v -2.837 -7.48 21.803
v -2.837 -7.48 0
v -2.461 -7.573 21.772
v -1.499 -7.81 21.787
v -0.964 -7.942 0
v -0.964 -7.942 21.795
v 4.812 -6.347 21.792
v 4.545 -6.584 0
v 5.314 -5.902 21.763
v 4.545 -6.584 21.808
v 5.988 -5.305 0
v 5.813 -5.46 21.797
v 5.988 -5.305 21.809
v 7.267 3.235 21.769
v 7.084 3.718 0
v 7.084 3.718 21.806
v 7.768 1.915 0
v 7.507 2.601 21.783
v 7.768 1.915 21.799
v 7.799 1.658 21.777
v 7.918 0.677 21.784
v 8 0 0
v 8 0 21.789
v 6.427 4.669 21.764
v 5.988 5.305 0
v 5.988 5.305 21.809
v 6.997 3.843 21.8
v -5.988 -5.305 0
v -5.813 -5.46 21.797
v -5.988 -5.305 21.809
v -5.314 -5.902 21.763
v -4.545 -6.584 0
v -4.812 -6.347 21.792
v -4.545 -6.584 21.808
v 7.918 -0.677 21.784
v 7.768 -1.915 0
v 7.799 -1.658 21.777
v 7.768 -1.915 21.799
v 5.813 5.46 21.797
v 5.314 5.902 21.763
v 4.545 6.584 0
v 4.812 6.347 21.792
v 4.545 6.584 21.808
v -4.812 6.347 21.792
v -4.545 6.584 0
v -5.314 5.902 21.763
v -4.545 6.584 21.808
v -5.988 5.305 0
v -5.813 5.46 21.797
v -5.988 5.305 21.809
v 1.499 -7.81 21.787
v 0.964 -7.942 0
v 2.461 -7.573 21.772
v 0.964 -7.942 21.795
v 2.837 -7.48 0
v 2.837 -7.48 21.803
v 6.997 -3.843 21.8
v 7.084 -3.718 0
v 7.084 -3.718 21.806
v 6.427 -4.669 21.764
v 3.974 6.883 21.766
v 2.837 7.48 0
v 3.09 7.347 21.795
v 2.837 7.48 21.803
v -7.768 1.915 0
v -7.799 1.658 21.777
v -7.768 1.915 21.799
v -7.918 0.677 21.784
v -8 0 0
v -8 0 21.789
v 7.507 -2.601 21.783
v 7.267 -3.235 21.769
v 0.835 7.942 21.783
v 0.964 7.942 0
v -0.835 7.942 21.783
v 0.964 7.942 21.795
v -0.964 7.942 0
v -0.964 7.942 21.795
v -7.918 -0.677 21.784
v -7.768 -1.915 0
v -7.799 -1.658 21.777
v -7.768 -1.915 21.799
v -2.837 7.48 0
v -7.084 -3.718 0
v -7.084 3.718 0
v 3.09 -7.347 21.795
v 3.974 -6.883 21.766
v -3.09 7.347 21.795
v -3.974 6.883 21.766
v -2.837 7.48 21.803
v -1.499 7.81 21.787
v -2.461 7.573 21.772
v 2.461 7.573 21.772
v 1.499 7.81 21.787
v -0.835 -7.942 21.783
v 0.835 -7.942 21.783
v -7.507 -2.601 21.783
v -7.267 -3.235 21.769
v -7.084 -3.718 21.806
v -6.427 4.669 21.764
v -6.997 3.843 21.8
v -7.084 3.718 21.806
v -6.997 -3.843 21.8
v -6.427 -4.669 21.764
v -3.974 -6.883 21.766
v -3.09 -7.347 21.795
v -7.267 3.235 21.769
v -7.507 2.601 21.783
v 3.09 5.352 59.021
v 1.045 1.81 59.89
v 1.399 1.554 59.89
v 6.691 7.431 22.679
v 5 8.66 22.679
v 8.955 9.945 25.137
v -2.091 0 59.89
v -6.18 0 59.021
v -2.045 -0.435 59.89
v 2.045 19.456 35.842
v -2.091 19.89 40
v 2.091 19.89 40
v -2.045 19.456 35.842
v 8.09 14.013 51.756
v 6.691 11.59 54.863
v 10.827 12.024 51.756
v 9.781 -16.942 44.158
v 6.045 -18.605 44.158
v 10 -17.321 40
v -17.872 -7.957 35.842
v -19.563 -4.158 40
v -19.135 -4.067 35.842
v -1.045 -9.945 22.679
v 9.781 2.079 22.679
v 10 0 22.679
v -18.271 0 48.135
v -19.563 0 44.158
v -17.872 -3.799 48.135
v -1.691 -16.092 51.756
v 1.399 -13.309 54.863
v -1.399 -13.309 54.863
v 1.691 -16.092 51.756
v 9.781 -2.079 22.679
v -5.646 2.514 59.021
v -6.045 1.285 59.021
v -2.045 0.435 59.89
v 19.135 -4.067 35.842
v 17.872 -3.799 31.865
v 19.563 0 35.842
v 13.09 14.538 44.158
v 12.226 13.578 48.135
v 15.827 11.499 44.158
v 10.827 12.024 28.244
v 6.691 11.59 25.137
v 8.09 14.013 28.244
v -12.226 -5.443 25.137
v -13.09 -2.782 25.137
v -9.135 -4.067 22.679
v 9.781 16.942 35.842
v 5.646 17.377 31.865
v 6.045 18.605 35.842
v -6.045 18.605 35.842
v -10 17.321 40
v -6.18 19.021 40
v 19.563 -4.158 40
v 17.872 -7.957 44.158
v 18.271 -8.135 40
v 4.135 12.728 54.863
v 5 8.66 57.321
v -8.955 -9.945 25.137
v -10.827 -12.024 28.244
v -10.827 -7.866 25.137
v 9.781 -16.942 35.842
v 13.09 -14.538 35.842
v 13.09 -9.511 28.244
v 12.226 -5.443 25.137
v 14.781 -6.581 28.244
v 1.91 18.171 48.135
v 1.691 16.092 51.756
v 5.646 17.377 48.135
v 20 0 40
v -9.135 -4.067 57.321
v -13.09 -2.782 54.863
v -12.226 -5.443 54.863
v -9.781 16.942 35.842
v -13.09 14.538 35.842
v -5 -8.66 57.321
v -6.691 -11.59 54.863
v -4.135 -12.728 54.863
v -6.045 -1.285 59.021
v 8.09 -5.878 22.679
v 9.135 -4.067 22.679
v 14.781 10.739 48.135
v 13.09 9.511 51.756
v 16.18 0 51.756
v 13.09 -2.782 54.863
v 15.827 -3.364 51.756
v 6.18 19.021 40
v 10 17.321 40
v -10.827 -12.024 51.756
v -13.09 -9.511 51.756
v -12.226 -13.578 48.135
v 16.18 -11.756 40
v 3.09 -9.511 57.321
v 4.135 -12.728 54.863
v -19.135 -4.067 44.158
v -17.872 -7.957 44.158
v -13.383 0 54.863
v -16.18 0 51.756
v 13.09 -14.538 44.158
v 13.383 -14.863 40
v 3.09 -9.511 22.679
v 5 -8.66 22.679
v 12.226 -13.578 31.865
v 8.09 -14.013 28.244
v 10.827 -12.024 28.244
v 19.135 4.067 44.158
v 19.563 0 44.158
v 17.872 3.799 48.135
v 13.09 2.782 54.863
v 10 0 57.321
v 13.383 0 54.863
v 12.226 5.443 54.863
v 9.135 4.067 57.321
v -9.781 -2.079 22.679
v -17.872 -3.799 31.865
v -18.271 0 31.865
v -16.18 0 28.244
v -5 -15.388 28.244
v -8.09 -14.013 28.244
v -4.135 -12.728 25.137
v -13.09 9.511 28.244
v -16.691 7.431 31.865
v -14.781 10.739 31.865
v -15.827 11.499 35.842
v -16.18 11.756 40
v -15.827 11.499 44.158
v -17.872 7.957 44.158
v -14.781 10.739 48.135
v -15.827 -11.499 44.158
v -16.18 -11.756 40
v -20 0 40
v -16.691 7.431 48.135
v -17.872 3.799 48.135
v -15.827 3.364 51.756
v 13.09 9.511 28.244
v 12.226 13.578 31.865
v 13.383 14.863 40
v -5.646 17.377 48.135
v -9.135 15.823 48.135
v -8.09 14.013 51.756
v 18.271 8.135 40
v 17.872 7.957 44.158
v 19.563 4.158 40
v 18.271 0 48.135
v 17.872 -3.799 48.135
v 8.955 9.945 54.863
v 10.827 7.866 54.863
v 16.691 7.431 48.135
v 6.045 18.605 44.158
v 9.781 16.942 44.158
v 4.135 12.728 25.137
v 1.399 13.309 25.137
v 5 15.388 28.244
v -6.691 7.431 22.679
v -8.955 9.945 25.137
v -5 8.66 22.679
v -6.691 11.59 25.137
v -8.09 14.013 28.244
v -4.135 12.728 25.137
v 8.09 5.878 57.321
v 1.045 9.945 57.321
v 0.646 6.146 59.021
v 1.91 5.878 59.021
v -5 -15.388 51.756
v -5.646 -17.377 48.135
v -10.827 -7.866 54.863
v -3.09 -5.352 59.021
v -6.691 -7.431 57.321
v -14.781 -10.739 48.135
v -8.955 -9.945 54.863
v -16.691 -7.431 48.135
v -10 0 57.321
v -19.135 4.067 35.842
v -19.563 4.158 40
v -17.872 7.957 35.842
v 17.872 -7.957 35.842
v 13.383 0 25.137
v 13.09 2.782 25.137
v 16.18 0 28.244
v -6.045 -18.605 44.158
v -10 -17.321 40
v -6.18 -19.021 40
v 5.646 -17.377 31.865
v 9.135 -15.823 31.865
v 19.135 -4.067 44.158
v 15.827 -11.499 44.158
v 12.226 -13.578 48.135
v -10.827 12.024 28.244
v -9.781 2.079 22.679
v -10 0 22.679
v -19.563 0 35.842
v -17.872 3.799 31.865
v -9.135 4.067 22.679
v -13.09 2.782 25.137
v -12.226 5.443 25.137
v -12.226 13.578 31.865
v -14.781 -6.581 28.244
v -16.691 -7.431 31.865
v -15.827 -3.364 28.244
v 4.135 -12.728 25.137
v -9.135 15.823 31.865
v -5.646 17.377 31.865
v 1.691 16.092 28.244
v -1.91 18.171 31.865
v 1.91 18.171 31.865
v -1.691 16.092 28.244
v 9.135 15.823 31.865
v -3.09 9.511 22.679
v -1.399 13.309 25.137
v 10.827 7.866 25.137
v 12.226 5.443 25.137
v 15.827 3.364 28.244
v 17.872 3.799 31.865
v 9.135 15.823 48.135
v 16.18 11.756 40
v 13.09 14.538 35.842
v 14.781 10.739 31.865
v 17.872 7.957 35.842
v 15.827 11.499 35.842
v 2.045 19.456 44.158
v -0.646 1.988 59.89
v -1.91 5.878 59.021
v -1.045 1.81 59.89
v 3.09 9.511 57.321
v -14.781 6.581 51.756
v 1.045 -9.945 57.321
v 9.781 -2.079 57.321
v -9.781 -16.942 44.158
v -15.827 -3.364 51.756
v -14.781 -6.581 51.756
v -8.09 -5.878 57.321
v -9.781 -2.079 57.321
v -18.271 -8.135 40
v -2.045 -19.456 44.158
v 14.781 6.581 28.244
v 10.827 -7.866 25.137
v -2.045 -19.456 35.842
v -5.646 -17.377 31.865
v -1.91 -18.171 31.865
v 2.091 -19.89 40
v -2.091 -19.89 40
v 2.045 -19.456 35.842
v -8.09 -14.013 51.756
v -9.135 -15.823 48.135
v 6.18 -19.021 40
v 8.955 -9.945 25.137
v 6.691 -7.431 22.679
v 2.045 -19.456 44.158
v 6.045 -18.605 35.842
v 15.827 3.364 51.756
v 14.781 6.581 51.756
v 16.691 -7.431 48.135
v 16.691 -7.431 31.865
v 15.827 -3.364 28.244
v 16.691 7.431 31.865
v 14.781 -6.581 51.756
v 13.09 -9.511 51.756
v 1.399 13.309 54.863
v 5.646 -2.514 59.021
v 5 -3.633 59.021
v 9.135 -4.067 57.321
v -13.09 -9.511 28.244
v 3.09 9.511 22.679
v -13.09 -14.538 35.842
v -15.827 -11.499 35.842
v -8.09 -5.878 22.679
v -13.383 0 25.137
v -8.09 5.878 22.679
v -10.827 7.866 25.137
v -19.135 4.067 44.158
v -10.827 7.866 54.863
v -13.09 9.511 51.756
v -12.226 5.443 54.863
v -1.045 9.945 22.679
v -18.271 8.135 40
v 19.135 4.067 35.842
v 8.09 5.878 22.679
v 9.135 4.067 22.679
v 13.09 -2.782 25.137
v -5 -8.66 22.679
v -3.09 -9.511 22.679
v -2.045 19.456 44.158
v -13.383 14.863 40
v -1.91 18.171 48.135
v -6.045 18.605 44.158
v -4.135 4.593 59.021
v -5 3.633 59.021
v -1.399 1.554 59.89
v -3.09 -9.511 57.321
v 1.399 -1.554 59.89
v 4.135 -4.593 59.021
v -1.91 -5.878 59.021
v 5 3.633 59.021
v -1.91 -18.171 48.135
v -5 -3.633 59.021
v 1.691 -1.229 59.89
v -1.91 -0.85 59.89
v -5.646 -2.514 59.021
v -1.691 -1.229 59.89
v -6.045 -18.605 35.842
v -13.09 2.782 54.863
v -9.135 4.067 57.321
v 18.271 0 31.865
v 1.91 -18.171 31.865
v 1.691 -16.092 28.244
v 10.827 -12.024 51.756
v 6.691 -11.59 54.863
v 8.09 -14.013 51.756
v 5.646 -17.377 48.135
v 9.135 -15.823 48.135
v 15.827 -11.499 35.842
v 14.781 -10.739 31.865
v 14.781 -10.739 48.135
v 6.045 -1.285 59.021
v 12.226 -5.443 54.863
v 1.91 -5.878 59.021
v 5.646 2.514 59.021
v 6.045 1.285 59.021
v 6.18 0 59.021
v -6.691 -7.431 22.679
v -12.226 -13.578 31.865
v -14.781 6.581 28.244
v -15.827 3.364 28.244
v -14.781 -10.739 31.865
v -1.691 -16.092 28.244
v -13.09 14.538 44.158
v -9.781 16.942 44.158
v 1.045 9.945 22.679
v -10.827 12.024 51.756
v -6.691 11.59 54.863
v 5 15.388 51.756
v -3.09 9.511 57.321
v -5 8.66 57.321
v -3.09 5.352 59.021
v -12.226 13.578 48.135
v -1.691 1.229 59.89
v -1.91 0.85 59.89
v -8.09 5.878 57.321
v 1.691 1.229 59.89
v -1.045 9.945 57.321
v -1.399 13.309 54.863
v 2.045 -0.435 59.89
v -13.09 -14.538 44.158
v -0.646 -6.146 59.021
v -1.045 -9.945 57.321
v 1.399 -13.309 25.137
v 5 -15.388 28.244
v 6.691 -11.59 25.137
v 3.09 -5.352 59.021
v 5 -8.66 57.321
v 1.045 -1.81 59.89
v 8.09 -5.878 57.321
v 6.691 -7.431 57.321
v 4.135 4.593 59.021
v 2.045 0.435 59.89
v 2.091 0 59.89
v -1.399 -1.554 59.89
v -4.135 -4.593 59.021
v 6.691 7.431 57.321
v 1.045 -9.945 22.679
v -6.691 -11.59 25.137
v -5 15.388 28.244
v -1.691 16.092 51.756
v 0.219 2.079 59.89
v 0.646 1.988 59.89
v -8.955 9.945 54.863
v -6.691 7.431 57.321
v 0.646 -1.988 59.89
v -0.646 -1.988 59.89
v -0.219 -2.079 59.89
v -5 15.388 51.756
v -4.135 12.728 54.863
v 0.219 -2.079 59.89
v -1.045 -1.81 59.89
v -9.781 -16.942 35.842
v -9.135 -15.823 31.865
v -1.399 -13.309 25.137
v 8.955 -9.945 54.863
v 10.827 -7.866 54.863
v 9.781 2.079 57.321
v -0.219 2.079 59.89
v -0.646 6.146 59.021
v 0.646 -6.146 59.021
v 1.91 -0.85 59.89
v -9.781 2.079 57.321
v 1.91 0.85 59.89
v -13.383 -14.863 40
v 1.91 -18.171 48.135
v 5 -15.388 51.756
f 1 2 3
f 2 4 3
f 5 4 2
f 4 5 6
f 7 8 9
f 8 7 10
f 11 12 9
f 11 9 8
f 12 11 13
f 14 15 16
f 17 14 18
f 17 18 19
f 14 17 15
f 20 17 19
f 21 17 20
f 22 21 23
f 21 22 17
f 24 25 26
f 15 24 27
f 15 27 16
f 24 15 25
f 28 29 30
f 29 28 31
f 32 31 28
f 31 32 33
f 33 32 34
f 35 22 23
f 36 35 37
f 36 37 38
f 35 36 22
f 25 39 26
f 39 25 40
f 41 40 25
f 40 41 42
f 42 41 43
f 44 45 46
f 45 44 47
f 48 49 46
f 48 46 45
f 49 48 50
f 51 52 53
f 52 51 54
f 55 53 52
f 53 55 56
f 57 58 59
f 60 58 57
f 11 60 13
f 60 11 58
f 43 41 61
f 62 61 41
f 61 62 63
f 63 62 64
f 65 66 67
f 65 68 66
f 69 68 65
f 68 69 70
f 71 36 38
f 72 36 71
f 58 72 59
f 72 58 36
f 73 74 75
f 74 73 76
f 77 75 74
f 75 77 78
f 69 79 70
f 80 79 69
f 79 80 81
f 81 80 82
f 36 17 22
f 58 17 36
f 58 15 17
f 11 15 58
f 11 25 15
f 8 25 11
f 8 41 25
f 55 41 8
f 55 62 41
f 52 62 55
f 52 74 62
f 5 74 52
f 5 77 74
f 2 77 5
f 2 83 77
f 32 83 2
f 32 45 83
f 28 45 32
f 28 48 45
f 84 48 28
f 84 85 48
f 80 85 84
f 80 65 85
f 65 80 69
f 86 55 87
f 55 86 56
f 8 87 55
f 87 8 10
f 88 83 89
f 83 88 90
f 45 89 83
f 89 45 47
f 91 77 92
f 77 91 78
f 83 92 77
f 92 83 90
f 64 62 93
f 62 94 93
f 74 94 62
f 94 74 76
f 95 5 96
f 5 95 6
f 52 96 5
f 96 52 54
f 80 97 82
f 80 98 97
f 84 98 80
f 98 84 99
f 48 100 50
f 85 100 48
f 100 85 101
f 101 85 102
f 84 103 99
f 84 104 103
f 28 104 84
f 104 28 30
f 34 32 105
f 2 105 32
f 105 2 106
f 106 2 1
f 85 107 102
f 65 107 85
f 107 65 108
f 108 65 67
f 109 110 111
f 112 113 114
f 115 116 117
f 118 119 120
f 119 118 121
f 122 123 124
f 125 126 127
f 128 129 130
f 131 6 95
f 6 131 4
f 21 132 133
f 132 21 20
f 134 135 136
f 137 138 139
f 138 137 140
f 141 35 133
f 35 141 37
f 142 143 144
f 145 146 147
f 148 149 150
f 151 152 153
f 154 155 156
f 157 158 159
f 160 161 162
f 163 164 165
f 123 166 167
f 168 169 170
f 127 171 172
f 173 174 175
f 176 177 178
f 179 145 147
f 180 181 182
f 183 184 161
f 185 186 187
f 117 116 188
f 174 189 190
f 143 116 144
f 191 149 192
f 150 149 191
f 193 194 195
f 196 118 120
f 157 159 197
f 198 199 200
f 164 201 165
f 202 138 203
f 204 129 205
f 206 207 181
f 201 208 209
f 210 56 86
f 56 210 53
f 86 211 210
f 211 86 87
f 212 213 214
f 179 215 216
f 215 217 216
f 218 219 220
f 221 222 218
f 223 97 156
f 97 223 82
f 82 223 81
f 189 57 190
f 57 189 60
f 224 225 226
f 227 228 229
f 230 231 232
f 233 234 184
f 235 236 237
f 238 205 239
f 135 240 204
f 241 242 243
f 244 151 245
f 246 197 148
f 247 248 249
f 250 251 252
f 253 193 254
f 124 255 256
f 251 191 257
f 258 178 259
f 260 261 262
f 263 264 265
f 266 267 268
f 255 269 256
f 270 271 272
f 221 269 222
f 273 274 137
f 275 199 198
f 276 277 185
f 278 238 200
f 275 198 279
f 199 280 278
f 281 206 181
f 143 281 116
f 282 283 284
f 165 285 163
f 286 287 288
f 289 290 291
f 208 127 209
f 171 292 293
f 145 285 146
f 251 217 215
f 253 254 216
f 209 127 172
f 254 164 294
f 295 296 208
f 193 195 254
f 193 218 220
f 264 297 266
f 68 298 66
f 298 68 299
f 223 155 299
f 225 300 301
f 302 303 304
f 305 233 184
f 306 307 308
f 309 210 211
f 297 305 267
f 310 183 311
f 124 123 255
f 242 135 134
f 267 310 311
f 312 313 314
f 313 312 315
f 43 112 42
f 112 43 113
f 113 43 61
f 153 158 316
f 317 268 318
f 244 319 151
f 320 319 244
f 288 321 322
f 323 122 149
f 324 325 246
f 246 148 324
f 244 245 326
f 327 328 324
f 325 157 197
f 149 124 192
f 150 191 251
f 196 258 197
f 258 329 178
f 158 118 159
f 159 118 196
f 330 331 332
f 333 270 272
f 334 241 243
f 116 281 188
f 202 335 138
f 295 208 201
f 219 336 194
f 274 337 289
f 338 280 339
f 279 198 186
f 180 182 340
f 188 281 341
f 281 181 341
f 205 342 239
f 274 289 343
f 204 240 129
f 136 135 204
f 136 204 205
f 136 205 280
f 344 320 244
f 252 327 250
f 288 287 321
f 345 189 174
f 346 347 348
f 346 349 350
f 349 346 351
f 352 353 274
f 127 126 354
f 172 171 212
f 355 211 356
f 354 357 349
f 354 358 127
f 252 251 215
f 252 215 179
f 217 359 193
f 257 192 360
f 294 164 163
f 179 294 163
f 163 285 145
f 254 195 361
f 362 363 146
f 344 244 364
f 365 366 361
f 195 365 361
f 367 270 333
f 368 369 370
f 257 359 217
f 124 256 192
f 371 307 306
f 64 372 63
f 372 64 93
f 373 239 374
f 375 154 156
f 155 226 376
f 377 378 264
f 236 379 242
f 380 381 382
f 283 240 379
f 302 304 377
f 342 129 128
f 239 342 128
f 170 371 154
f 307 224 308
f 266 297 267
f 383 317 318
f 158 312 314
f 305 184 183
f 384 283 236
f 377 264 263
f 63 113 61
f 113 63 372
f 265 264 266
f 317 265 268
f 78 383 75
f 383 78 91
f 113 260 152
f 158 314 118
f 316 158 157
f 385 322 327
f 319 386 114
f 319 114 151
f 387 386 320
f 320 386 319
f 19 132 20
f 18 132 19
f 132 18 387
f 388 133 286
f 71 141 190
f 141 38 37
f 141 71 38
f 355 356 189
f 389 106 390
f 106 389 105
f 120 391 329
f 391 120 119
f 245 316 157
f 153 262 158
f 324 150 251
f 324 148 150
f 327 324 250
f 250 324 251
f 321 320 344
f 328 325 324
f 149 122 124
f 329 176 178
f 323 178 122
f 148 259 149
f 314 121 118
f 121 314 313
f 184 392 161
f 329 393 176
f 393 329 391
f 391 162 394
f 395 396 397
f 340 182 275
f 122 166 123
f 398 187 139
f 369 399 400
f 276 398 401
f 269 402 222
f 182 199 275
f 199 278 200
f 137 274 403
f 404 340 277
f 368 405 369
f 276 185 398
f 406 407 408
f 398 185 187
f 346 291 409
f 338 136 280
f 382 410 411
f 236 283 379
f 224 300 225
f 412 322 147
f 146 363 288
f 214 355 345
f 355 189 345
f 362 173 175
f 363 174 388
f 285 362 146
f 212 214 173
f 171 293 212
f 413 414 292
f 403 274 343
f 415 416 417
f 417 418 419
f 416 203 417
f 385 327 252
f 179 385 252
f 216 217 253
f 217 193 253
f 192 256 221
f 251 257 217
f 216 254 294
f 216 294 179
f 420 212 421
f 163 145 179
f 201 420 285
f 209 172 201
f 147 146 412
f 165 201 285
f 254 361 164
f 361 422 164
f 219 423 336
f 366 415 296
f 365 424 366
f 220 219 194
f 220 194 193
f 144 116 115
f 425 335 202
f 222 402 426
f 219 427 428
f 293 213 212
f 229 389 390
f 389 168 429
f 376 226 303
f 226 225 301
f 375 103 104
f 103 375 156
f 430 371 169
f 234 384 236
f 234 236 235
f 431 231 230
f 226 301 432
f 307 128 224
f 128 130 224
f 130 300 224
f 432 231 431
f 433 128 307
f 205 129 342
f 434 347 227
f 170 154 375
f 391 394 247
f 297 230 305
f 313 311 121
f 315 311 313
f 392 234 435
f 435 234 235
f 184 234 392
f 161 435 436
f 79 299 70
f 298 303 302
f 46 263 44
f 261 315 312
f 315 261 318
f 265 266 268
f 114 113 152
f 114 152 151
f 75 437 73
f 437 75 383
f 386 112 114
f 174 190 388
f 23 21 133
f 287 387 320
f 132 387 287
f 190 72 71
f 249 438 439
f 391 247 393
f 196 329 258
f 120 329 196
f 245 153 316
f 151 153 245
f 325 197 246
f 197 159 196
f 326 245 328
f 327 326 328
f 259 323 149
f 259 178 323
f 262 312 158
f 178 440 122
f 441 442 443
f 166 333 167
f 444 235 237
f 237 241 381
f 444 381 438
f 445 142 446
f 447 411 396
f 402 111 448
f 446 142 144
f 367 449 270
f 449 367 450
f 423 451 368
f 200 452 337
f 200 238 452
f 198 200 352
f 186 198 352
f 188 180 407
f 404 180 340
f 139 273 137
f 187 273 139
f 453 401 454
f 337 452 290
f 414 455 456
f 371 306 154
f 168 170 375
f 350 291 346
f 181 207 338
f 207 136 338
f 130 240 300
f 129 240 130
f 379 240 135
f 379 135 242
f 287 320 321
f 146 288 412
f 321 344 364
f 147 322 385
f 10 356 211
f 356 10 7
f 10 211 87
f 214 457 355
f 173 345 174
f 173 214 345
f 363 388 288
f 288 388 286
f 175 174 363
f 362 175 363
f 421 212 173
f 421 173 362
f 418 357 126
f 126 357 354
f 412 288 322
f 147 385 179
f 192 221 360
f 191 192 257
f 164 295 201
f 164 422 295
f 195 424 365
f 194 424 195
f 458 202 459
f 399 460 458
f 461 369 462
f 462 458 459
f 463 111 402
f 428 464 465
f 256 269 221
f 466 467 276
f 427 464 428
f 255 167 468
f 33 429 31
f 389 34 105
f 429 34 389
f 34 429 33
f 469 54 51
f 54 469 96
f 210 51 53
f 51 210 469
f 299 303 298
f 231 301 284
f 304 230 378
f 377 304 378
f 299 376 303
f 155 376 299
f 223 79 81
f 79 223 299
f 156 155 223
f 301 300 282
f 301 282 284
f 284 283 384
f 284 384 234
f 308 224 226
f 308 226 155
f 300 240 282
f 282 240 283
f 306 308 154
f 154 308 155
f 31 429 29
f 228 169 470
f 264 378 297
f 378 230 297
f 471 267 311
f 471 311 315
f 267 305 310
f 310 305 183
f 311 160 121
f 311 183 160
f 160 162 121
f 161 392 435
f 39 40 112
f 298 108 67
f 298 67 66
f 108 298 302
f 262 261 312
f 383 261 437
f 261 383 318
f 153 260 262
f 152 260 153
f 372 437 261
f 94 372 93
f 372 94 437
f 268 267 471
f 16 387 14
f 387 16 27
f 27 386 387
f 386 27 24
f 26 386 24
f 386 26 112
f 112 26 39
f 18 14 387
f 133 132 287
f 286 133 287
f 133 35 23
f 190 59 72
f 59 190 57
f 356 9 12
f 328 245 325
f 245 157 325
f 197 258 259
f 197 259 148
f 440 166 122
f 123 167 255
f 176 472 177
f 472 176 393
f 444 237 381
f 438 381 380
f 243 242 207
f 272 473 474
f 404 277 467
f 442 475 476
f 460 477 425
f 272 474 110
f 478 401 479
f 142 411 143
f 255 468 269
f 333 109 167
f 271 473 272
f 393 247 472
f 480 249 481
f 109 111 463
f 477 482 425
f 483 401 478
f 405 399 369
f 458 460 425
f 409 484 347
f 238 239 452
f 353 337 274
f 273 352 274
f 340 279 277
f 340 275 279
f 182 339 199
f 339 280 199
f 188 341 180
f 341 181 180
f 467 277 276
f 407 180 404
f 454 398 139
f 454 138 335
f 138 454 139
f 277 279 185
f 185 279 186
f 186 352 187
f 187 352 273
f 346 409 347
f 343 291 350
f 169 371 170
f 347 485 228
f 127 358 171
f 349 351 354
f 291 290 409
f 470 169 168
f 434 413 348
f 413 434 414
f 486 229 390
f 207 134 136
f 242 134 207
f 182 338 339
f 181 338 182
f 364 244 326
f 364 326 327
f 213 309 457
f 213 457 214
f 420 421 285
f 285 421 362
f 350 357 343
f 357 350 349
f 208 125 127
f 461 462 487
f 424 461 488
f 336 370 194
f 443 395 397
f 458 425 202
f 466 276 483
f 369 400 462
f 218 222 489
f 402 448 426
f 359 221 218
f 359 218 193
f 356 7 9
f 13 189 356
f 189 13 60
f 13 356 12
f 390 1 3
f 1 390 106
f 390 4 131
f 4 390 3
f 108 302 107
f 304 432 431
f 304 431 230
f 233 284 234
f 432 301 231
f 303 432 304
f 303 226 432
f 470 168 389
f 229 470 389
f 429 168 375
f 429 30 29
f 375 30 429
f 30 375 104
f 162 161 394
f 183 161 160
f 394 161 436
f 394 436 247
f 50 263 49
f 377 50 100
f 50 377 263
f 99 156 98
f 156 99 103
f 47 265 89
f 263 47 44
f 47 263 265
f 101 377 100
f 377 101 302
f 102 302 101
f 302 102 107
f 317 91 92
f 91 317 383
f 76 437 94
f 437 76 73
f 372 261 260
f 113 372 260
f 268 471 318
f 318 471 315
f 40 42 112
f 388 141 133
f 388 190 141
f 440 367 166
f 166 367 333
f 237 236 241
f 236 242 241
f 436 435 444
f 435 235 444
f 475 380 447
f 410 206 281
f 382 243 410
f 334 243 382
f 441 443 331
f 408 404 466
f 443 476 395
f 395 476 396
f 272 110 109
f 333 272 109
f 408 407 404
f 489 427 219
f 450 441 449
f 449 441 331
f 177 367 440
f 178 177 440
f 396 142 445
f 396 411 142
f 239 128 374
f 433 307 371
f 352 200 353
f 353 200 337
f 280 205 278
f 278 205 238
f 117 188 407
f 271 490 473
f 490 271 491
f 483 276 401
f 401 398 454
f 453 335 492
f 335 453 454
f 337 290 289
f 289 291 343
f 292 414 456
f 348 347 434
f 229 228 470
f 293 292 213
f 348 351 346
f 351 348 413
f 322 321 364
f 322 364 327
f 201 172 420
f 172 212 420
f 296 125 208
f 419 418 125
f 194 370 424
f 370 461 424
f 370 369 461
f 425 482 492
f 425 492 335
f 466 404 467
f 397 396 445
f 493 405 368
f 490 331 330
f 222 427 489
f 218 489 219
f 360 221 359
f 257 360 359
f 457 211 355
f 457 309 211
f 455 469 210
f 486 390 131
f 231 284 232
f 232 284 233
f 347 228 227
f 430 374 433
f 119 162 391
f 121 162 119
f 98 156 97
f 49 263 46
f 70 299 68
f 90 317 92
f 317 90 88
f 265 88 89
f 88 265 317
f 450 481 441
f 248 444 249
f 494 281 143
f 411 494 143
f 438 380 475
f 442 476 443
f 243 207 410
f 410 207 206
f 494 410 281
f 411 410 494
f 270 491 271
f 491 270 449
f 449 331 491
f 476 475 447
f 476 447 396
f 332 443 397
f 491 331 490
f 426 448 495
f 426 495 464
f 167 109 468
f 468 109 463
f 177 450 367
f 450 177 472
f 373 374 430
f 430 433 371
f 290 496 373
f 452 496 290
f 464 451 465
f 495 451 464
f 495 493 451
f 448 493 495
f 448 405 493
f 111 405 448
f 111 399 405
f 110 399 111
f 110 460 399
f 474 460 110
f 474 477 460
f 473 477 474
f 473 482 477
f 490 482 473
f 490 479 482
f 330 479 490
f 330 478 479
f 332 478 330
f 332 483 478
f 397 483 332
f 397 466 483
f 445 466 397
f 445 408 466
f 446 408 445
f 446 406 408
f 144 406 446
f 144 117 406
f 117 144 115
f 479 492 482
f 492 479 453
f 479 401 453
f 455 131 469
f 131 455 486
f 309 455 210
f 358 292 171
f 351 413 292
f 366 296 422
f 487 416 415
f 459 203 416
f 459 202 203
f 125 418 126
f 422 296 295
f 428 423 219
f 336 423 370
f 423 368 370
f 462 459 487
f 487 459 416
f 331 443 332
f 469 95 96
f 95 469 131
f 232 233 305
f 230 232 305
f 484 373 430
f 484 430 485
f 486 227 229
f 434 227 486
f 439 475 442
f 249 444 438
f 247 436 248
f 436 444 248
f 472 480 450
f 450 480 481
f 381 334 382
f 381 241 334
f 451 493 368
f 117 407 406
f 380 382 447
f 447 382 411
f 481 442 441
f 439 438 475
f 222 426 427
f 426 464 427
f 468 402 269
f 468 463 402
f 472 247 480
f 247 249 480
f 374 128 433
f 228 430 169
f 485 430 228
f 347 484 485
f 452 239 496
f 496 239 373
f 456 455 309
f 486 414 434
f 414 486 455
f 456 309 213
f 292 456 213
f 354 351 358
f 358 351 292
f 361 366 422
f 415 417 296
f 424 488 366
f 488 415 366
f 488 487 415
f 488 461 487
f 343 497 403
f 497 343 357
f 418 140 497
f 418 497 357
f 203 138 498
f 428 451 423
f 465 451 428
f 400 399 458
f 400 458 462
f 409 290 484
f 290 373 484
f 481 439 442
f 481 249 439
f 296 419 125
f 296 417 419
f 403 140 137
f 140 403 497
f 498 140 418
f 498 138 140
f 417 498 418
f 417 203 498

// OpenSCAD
union() {
    cylinder(h = 30, r = 8);
    translate([0, 0, 40]) sphere(20);
}
